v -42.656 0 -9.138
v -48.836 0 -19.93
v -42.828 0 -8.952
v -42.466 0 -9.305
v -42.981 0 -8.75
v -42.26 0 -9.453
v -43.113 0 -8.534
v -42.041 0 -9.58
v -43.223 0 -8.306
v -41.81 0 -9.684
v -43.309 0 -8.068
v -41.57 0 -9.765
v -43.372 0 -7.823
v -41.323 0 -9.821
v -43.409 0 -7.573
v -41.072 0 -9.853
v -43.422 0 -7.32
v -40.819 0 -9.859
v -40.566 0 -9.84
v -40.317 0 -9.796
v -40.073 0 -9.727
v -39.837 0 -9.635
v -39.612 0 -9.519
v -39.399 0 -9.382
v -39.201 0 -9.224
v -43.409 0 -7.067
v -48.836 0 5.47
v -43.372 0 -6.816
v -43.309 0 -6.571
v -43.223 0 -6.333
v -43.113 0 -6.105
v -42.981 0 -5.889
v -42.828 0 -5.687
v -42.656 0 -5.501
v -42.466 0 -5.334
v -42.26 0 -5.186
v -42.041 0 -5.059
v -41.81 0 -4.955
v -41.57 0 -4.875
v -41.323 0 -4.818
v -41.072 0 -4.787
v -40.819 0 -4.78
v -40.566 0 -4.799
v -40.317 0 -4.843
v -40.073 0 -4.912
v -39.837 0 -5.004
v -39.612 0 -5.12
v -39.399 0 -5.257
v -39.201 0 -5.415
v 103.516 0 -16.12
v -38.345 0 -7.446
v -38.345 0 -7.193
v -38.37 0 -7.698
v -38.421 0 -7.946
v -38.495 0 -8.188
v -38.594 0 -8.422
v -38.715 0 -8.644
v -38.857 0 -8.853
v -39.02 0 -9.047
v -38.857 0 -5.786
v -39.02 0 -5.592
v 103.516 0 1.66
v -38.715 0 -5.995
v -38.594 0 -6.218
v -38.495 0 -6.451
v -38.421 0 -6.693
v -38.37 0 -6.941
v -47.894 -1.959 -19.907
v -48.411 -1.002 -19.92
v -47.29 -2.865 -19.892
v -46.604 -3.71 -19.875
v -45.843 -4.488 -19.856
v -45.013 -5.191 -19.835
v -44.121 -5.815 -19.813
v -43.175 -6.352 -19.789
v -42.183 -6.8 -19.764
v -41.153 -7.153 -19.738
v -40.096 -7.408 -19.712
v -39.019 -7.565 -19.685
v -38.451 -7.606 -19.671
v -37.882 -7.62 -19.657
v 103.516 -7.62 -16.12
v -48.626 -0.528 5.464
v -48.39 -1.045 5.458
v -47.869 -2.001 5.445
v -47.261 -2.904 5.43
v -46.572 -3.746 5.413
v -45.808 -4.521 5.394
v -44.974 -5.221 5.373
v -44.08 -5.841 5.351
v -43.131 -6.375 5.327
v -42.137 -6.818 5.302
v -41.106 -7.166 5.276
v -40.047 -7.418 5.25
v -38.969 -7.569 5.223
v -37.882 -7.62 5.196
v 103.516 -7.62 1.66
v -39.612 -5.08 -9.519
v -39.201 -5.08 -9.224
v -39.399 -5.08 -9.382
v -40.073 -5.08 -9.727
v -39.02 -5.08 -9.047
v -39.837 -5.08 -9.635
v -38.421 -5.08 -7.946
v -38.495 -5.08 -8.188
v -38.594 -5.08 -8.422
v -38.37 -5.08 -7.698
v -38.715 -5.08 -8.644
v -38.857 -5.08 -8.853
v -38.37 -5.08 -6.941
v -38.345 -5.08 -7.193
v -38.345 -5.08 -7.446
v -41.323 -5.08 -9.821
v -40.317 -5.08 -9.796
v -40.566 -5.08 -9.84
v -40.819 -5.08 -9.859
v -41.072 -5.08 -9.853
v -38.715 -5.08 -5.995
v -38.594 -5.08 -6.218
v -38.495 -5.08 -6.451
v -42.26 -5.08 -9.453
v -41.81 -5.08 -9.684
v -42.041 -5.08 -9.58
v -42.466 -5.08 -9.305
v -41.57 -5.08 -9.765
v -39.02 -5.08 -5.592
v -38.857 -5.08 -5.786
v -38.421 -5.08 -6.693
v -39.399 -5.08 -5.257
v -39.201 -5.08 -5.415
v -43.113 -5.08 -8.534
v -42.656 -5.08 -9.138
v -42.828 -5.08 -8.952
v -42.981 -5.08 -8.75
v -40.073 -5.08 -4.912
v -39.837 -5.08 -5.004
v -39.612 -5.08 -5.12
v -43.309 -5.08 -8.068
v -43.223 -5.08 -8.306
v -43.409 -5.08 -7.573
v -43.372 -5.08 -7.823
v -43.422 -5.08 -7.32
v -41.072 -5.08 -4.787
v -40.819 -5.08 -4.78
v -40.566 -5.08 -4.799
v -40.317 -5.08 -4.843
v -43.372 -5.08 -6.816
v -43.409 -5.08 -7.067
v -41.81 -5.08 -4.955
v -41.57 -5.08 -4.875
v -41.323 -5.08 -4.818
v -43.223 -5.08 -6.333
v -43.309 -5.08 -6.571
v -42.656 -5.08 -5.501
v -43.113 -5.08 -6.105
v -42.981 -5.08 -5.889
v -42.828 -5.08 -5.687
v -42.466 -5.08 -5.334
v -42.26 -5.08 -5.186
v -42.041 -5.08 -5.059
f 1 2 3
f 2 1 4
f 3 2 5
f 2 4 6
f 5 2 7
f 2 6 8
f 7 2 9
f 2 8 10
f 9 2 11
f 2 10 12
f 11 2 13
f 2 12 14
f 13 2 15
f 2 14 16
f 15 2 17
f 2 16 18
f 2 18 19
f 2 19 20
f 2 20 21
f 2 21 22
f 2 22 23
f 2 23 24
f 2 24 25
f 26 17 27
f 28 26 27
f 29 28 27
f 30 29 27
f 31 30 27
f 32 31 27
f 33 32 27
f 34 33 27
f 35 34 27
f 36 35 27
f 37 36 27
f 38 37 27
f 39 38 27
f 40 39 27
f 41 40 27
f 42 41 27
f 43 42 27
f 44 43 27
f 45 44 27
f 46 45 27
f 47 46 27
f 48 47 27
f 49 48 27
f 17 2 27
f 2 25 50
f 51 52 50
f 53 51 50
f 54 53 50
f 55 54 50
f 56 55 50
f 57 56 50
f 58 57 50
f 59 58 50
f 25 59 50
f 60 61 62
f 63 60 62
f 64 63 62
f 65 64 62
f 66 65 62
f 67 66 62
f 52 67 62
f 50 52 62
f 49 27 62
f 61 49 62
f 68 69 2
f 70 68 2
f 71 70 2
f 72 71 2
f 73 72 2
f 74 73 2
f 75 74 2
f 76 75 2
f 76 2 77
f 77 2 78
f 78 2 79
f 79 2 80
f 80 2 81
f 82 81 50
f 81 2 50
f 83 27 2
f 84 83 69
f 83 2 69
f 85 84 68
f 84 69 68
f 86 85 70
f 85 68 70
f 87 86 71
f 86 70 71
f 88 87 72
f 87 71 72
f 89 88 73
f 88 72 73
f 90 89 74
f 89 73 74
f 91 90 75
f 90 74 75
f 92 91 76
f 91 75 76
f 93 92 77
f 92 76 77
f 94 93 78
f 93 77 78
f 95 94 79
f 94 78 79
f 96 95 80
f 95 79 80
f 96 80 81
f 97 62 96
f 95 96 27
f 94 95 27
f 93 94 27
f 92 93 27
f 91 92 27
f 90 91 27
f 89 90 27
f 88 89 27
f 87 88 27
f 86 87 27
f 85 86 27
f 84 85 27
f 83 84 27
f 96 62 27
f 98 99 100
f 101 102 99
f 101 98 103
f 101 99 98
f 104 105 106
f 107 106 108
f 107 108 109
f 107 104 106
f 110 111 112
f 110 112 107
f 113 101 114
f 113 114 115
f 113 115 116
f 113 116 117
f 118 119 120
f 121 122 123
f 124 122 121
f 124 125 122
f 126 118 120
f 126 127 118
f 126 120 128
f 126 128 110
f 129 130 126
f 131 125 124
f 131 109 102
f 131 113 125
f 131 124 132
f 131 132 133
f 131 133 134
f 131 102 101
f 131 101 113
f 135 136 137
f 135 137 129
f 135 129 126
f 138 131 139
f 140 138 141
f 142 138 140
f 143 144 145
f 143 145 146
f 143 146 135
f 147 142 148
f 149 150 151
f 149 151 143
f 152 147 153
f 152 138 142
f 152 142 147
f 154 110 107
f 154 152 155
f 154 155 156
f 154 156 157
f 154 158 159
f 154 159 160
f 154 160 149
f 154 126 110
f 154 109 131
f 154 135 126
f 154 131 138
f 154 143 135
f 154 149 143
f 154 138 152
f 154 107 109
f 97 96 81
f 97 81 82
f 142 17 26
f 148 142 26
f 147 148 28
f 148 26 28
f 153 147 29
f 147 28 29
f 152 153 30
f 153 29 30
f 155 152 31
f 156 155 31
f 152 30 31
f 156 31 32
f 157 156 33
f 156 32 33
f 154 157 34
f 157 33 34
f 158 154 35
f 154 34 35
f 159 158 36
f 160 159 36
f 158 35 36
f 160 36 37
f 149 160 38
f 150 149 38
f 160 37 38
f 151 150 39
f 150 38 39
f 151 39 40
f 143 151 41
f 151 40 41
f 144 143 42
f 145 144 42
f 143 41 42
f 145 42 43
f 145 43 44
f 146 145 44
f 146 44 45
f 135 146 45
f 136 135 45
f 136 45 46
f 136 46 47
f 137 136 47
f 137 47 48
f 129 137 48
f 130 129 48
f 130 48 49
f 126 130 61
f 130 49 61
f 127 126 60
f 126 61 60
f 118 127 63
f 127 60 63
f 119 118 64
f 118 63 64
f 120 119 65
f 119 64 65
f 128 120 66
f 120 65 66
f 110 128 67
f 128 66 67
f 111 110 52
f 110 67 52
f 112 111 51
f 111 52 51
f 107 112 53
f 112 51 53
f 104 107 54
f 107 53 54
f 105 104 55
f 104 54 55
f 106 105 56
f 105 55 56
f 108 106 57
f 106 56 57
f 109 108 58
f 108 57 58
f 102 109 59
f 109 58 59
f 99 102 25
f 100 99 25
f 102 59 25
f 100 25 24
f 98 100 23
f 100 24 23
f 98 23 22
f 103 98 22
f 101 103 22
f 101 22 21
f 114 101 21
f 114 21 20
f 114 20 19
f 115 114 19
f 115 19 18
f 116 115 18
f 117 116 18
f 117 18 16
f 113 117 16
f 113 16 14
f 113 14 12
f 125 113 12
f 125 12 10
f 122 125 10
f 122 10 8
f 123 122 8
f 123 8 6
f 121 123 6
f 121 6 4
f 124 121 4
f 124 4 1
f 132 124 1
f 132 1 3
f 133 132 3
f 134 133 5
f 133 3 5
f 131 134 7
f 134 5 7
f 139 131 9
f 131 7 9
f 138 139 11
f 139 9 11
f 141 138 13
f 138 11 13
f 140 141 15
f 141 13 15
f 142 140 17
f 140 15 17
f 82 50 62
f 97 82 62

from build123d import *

# Parameters (mm, degrees)
F1_DEPTH    = 7.62
F2_T1_DEPTH = 80.1722009782
F3_R        = 2.54
F4_DEPTH    = 5.08


# Not quite as in the source:
# - a fillet or chamfer that OpenCascade refuses, or shapes differently, is made with other operations: its cross-section is extruded or revolved along the edge and cut away or added


with BuildPart() as f1:
    # F0 (on Front) → F1 (new body)
    with BuildSketch(Plane.XZ):
        Polygon((-48.8362722099, 5.4695218146), (-48.8362722099, -19.9304781854), (103.5160953464, -16.1204781854), (103.5160953464, 1.6595218146), align=None)
    extrude(amount=F1_DEPTH)

    # F2: fillet of radius 11.684 on 1 edges, made by hand

    # F2_s2 → F2_t1 (cut)
    with BuildSketch(Plane.XY.offset(-47.3165786745)):
        with BuildLine():
            ThreePointArc((-48.8362722099, 0), (-44.5538661868, -5.527653455), (-37.8818320142, -7.62))
            Line((-37.8818320142, -7.62), (-48.8362722099, -7.62))
            Line((-48.8362722099, -7.62), (-48.8362722099, 0))
        make_face()
    extrude(amount=F2_T1_DEPTH, mode=Mode.SUBTRACT)

    # F3 (on face) → F4 (cut)
    with BuildSketch(Plane(origin=(0, 0, 0), x_dir=(-1, 0, 0), z_dir=(0, 1, 0))):
        with Locations((40.8820770681, -7.3196464218)):
            Circle(F3_R)
    extrude(amount=-F4_DEPTH, mode=Mode.SUBTRACT)


solid = f1.part
